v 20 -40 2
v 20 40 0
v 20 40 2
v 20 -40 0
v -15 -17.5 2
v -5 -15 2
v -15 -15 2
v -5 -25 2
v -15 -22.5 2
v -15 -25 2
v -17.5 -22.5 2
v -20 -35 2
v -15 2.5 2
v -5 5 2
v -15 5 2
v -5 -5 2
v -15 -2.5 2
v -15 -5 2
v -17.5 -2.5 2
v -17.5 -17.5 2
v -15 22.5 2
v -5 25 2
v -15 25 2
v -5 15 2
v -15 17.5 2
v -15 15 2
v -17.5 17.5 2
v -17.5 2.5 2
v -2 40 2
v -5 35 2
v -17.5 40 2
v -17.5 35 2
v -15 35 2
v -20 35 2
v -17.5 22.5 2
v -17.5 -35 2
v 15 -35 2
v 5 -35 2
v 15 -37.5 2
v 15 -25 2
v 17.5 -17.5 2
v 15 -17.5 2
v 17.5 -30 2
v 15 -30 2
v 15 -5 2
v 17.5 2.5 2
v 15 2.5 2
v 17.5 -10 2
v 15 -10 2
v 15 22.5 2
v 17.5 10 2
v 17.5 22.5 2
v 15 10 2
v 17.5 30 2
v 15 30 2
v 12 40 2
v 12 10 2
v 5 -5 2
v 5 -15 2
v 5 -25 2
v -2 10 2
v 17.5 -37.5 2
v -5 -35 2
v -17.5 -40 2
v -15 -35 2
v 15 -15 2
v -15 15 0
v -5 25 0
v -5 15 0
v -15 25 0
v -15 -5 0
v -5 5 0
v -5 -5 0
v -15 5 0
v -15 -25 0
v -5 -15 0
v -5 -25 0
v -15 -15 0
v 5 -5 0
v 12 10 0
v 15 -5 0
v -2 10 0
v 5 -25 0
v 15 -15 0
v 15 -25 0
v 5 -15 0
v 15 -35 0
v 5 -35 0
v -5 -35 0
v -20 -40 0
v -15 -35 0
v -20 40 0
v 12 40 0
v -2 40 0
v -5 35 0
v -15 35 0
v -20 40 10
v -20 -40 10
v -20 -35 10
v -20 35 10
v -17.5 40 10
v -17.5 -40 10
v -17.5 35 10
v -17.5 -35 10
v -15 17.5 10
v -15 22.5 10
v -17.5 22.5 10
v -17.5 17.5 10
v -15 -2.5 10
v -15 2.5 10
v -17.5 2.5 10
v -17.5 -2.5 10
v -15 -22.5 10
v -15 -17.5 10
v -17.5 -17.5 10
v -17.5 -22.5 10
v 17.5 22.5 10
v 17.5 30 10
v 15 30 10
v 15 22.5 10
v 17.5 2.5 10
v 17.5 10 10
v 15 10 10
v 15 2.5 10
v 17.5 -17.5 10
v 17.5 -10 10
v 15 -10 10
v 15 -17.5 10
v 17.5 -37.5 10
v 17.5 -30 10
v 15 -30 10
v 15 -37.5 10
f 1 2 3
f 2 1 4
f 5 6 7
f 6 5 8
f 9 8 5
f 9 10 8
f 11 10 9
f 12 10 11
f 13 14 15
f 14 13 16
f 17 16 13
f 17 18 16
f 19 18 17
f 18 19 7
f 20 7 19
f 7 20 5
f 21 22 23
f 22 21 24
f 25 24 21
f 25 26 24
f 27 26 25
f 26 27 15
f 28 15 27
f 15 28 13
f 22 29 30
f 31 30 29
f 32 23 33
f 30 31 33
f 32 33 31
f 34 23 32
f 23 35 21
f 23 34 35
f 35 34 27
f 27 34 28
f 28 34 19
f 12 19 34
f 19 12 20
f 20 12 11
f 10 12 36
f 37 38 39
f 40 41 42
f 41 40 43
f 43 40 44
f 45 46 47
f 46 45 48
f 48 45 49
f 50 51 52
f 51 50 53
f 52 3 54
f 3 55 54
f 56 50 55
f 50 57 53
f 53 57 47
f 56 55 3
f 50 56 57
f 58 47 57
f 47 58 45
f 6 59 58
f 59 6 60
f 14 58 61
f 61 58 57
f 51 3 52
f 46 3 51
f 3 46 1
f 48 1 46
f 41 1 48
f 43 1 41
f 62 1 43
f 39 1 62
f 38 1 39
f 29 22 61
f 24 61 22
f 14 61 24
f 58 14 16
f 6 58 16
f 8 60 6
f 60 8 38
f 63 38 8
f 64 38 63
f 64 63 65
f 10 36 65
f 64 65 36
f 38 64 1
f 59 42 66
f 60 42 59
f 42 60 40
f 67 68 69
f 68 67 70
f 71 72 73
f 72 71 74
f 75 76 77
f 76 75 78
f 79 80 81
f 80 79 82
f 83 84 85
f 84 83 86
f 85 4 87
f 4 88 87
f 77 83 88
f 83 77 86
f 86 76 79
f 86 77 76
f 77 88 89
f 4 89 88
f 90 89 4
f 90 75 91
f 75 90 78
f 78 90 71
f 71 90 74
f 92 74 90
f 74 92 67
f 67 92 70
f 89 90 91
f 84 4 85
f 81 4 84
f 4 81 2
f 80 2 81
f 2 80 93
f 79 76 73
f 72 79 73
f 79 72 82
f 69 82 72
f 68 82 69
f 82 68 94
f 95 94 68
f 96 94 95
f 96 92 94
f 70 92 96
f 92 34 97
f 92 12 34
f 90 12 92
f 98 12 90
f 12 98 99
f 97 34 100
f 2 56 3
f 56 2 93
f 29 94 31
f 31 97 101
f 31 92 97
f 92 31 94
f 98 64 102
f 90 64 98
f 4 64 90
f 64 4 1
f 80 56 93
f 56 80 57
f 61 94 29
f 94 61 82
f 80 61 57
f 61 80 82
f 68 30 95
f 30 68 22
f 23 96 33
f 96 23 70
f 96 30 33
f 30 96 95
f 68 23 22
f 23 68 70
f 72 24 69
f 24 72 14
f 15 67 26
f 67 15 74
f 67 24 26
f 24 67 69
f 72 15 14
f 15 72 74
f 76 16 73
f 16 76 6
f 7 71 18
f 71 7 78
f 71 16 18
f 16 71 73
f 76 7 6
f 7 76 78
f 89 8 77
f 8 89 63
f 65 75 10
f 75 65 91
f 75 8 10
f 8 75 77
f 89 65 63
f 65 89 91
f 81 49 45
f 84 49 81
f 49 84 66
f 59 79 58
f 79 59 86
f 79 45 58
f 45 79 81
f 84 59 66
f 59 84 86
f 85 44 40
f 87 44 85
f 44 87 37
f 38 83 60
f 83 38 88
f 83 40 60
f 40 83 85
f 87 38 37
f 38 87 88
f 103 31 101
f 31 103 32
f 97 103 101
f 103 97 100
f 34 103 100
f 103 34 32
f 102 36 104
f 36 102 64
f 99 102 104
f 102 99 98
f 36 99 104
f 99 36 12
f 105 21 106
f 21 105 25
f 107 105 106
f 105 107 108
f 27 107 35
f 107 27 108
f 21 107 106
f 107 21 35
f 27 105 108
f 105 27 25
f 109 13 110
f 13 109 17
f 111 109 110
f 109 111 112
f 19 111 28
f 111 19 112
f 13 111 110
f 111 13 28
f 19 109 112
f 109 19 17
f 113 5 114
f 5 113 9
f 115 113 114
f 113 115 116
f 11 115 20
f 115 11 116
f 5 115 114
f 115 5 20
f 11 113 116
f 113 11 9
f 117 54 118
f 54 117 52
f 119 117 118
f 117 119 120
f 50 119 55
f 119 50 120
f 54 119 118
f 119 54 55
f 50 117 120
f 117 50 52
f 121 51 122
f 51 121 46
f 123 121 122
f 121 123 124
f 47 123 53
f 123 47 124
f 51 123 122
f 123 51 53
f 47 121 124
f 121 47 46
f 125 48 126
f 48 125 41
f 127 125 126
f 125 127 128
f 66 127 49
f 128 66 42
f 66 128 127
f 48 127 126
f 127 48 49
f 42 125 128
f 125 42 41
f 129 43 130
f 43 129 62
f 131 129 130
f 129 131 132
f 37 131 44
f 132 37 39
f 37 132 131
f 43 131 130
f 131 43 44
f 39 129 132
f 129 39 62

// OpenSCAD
module aa(){
    difference(){
    translate([10, 10-(10-2.6)/2, 1+4])cube([20-5.2, 10-2.6, 10],center=true);
    translate([10, 10, 1+4])cube([12,12,99],center=true);
    }
    difference(){
    translate([10, 10, 1])cube([20,20,2],center=true);
    translate([10, 10, 1])cube([20-5.2, 20-5.2, 99],center=true);
    for(x=[0:2.5:20])translate([x, 20, 0])cylinder(h=9,r=0.8,center=true, $fn=8);
    for(x=[0:2.5:20])translate([x,  0, 0])cylinder(h=9,r=0.8,center=true, $fn=8);
    for(y=[2.5:2.5:17.5])translate([20, y, 0])cylinder(h=9,r=0.8,center=true, $fn=8);
    for(y=[2.5:2.5:17.5])translate([ 0, y, 0])cylinder(h=9,r=0.8,center=true, $fn=8);
    }
}

module bb(){
    //left
    translate([-20+1.25, 40-2.5, 2+4])cube([2.5, 5, 8],center=true);
    translate([-20+1.25,-40+2.5, 2+4])cube([2.5, 5, 8],center=true);
    //left mid
    translate([-20+1.25*3, 20, 2+4])cube([2.5, 5, 8],center=true);
    translate([-20+1.25*3,  0, 2+4])cube([2.5, 5, 8],center=true);
    translate([-20+1.25*3,-20, 2+4])cube([2.5, 5, 8],center=true);
    //mid
    //translate([-1.25, 5, 2+4])cube([2.5, 10, 8],center=true);
    //translate([-1.25, -37.5/2, 2+4])cube([2.5, 37.5, 8],center=true);
    //right
    translate([20-1.25*3,  20+2.5+7.5/2, 2+4])cube([2.5, 7.5, 8],center=true);
    translate([20-1.25*3,   0+2.5+7.5/2, 2+4])cube([2.5, 7.5, 8],center=true);
    translate([20-1.25*3, -20+2.5+7.5/2, 2+4])cube([2.5, 7.5, 8],center=true);
    translate([20-1.25*3, -40+2.5+7.5/2, 2+4])cube([2.5, 7.5, 8],center=true);
    //
    difference(){
    translate([0, 0, 1])cube([40,80,2],center=true);
    translate([5, 40-15, 1])cube([14,30,99],center=true);
    //l
    translate([-10,  30, 0])cube([10, 10, 99],center=true);
    translate([-10,  10, 0])cube([10, 10, 99],center=true);
    translate([-10, -10, 0])cube([10, 10, 99],center=true);
    translate([-10, -30, 0])cube([10, 10, 99],center=true);
    //r
    translate([ 10, -10, 0])cube([10, 10, 99],center=true);
    translate([ 10, -30, 0])cube([10, 10, 99],center=true);
    }
}


xx=2;
if(xx==1){
    for(y=[0:20:140]){
        for(x=[0:20:60]){
            translate([x,y,0])aa();
        }
    }
}
else if(xx==2){
    bb();
}
